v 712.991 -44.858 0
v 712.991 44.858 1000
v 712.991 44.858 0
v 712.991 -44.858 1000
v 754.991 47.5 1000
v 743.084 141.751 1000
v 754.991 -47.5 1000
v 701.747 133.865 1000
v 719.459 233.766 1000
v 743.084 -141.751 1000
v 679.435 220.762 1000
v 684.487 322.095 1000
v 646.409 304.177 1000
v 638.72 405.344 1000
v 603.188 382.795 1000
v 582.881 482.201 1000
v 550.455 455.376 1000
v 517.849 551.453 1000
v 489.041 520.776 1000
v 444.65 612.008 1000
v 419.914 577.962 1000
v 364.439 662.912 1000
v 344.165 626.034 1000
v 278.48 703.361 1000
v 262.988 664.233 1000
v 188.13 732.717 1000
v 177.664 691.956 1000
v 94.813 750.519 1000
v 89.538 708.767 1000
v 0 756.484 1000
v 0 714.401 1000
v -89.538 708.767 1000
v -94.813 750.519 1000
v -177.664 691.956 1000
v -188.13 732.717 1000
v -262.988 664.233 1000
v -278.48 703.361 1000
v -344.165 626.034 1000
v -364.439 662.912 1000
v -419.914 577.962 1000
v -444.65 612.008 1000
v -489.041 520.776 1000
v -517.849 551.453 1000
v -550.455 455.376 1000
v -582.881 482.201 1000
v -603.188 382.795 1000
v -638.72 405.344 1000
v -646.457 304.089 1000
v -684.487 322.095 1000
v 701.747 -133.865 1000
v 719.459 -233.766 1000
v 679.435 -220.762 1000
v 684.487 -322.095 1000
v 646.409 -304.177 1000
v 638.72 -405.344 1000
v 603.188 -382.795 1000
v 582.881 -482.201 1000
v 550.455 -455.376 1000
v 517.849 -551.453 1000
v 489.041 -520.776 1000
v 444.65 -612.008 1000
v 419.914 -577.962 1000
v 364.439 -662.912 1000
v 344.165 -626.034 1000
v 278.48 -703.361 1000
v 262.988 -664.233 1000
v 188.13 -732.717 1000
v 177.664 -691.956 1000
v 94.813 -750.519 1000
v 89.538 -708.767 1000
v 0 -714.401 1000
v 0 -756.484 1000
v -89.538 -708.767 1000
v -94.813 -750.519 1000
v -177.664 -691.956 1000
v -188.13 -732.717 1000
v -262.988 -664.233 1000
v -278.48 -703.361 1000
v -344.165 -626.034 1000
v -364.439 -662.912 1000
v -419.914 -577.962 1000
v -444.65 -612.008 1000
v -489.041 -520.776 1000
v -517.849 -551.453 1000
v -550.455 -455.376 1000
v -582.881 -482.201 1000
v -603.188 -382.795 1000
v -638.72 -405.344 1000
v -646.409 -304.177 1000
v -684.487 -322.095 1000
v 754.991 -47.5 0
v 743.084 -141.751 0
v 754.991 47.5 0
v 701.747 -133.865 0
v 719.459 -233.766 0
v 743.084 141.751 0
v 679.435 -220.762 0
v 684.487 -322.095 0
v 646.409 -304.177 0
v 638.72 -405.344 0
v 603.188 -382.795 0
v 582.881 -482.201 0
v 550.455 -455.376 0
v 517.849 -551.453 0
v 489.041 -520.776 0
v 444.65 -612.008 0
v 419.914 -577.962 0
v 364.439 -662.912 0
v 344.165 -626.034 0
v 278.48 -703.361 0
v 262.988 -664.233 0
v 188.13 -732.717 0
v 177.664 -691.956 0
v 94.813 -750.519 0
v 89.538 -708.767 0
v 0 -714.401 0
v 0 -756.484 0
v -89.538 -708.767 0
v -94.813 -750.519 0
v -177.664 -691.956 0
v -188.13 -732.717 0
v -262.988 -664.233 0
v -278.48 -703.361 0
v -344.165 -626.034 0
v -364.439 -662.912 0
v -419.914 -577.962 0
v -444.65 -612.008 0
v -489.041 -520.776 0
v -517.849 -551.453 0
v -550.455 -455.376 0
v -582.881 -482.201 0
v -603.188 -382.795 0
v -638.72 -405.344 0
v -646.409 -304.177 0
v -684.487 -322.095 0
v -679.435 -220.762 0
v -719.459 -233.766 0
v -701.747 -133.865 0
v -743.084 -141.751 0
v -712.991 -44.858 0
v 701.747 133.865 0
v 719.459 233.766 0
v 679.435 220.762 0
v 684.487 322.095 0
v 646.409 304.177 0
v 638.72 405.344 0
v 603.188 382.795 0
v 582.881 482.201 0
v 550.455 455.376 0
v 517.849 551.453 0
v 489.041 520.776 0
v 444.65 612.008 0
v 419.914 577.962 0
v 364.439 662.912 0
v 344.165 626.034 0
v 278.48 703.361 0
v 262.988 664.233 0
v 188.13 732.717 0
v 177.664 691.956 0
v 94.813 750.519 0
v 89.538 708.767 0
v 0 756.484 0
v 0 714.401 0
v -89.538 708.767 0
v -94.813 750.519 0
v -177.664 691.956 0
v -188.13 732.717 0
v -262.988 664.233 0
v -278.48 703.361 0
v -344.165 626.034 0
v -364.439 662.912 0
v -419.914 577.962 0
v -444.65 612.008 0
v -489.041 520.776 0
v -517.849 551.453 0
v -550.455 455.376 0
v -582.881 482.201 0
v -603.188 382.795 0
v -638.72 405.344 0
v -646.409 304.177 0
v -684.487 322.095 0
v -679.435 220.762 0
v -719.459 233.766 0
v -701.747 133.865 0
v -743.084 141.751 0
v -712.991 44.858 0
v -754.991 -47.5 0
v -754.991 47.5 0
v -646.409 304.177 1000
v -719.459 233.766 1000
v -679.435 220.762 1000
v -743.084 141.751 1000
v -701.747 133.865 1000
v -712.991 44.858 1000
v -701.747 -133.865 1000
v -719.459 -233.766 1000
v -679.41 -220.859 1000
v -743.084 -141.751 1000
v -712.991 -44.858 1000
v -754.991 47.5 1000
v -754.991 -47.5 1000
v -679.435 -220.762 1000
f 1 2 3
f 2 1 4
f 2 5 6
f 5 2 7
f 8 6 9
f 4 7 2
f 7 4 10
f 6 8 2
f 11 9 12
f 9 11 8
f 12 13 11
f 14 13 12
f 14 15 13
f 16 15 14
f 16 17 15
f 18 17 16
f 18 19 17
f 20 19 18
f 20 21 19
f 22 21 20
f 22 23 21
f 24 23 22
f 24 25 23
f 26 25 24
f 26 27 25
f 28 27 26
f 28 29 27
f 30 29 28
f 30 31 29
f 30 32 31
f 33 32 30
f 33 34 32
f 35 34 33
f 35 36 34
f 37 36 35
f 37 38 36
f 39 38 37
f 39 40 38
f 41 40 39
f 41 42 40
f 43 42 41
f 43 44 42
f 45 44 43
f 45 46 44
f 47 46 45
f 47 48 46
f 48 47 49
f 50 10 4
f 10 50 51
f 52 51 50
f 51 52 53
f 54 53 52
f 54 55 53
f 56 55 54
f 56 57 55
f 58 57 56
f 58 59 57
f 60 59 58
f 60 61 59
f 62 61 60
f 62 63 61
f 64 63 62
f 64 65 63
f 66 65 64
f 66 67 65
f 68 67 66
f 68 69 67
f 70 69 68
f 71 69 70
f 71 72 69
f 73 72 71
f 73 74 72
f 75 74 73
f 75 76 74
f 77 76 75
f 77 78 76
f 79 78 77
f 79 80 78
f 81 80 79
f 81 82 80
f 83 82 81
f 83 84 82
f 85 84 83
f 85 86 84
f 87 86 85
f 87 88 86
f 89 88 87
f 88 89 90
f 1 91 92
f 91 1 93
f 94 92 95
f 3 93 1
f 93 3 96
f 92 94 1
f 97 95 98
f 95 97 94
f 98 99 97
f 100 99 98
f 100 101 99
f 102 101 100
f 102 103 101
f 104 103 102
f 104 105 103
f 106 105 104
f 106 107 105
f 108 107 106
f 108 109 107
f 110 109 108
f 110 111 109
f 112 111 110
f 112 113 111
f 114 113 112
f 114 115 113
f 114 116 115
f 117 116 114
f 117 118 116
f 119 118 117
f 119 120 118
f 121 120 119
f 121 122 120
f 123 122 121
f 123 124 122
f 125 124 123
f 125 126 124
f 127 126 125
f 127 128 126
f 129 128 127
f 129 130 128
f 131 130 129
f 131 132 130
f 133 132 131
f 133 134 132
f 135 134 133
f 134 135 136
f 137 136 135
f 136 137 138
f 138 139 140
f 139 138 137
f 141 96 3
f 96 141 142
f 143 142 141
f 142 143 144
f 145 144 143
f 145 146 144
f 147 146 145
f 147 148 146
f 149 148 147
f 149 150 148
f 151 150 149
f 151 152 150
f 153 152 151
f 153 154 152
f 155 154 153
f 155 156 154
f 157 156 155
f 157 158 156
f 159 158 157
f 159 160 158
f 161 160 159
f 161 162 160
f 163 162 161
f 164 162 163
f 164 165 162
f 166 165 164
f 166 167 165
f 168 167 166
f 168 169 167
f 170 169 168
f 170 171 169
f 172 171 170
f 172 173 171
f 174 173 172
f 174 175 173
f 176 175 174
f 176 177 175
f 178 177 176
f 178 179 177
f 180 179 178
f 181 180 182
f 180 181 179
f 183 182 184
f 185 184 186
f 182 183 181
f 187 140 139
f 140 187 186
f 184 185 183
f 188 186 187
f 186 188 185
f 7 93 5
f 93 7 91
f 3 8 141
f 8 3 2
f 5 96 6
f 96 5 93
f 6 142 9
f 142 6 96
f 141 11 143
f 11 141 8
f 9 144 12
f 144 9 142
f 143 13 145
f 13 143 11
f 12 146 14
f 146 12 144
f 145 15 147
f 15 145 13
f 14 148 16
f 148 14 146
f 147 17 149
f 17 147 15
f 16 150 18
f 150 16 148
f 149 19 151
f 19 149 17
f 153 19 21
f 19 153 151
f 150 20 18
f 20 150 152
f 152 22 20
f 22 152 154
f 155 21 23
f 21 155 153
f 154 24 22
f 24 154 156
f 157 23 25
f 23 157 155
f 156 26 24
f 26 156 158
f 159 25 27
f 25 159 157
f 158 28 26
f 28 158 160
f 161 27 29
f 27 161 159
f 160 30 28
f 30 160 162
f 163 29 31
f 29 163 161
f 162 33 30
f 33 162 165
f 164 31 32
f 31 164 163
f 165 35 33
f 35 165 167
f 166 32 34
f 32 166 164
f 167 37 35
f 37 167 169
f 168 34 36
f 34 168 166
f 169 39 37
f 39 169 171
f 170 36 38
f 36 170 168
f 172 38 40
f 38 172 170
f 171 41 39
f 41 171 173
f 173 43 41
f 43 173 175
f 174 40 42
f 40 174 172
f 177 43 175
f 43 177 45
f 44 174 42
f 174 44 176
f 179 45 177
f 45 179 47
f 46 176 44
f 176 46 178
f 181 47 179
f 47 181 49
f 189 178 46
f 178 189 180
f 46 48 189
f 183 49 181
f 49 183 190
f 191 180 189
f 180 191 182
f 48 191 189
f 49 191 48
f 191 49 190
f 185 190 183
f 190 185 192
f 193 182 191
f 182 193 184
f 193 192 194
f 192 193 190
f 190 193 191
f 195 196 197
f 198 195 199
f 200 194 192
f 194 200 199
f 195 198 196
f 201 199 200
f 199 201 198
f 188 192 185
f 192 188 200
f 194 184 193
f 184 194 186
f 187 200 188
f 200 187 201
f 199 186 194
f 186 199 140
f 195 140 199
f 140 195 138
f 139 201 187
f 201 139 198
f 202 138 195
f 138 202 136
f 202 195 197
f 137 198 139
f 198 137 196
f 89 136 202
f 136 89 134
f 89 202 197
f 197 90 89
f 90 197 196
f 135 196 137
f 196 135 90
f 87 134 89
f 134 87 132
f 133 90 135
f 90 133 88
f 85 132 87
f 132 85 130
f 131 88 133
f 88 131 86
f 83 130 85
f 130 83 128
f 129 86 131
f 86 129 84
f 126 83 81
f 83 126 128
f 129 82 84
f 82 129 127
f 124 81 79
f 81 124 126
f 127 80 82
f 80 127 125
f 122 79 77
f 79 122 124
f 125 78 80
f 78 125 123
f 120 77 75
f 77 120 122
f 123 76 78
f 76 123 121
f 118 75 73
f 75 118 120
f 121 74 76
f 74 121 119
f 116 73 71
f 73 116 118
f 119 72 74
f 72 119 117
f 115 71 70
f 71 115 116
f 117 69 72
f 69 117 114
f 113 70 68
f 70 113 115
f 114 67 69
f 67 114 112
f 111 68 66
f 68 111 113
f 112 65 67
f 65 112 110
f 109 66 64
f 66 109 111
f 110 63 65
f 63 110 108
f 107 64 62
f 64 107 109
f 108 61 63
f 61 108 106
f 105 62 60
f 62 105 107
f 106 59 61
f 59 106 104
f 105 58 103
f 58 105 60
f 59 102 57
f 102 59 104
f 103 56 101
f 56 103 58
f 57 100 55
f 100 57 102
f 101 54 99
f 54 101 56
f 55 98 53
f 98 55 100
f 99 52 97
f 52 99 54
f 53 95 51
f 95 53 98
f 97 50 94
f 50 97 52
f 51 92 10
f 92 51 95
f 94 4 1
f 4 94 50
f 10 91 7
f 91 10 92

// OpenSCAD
// http://www.asete.fi/index1.html

// CONSTANTS:
plank = [42,95]; // X, Y eli seinän paksuus kertaa leveys
planks = 50;      // Lautojen määrä

// CONSTANTS:
// plank = [42,140]; // X, Y eli seinän paksuus kertaa leveys
// planks = 42;      // Lautojen määrä

// Fix manifold by adding a bit overlap to model
manifold_fix = 0.1; 

perimeter = planks*plank[1];
angle = 360/planks;
apothema = plank[1] / (2 * tan(180/planks));

echo("Angle between planks: ", angle, " degrees");
echo("Apothema: ", apothema, " mm");

cut = plank[1]/2 - (1-plank[0]/apothema)*(plank[1]/2);

echo("Inside plank width: ", plank[0]-2*cut, " mm");

polygon = [ [ 0, -plank[1]/2 ],
            [ 0, plank[1]/2 ],
            [ -plank[0], plank[1]/2-cut+manifold_fix ],
            [ -plank[0], -plank[1]/2+cut ]
          ];
echo("Plank is: ", polygon);

for (item = [0:planks-1]) {
    x = apothema * cos(item * angle);
    y = apothema * sin(item * angle);
    
    translate([x,y,0]) {
        rotate(item*angle) {
            linear_extrude(height = 1000) {
                polygon(polygon);
            }
        }
    }    
}
